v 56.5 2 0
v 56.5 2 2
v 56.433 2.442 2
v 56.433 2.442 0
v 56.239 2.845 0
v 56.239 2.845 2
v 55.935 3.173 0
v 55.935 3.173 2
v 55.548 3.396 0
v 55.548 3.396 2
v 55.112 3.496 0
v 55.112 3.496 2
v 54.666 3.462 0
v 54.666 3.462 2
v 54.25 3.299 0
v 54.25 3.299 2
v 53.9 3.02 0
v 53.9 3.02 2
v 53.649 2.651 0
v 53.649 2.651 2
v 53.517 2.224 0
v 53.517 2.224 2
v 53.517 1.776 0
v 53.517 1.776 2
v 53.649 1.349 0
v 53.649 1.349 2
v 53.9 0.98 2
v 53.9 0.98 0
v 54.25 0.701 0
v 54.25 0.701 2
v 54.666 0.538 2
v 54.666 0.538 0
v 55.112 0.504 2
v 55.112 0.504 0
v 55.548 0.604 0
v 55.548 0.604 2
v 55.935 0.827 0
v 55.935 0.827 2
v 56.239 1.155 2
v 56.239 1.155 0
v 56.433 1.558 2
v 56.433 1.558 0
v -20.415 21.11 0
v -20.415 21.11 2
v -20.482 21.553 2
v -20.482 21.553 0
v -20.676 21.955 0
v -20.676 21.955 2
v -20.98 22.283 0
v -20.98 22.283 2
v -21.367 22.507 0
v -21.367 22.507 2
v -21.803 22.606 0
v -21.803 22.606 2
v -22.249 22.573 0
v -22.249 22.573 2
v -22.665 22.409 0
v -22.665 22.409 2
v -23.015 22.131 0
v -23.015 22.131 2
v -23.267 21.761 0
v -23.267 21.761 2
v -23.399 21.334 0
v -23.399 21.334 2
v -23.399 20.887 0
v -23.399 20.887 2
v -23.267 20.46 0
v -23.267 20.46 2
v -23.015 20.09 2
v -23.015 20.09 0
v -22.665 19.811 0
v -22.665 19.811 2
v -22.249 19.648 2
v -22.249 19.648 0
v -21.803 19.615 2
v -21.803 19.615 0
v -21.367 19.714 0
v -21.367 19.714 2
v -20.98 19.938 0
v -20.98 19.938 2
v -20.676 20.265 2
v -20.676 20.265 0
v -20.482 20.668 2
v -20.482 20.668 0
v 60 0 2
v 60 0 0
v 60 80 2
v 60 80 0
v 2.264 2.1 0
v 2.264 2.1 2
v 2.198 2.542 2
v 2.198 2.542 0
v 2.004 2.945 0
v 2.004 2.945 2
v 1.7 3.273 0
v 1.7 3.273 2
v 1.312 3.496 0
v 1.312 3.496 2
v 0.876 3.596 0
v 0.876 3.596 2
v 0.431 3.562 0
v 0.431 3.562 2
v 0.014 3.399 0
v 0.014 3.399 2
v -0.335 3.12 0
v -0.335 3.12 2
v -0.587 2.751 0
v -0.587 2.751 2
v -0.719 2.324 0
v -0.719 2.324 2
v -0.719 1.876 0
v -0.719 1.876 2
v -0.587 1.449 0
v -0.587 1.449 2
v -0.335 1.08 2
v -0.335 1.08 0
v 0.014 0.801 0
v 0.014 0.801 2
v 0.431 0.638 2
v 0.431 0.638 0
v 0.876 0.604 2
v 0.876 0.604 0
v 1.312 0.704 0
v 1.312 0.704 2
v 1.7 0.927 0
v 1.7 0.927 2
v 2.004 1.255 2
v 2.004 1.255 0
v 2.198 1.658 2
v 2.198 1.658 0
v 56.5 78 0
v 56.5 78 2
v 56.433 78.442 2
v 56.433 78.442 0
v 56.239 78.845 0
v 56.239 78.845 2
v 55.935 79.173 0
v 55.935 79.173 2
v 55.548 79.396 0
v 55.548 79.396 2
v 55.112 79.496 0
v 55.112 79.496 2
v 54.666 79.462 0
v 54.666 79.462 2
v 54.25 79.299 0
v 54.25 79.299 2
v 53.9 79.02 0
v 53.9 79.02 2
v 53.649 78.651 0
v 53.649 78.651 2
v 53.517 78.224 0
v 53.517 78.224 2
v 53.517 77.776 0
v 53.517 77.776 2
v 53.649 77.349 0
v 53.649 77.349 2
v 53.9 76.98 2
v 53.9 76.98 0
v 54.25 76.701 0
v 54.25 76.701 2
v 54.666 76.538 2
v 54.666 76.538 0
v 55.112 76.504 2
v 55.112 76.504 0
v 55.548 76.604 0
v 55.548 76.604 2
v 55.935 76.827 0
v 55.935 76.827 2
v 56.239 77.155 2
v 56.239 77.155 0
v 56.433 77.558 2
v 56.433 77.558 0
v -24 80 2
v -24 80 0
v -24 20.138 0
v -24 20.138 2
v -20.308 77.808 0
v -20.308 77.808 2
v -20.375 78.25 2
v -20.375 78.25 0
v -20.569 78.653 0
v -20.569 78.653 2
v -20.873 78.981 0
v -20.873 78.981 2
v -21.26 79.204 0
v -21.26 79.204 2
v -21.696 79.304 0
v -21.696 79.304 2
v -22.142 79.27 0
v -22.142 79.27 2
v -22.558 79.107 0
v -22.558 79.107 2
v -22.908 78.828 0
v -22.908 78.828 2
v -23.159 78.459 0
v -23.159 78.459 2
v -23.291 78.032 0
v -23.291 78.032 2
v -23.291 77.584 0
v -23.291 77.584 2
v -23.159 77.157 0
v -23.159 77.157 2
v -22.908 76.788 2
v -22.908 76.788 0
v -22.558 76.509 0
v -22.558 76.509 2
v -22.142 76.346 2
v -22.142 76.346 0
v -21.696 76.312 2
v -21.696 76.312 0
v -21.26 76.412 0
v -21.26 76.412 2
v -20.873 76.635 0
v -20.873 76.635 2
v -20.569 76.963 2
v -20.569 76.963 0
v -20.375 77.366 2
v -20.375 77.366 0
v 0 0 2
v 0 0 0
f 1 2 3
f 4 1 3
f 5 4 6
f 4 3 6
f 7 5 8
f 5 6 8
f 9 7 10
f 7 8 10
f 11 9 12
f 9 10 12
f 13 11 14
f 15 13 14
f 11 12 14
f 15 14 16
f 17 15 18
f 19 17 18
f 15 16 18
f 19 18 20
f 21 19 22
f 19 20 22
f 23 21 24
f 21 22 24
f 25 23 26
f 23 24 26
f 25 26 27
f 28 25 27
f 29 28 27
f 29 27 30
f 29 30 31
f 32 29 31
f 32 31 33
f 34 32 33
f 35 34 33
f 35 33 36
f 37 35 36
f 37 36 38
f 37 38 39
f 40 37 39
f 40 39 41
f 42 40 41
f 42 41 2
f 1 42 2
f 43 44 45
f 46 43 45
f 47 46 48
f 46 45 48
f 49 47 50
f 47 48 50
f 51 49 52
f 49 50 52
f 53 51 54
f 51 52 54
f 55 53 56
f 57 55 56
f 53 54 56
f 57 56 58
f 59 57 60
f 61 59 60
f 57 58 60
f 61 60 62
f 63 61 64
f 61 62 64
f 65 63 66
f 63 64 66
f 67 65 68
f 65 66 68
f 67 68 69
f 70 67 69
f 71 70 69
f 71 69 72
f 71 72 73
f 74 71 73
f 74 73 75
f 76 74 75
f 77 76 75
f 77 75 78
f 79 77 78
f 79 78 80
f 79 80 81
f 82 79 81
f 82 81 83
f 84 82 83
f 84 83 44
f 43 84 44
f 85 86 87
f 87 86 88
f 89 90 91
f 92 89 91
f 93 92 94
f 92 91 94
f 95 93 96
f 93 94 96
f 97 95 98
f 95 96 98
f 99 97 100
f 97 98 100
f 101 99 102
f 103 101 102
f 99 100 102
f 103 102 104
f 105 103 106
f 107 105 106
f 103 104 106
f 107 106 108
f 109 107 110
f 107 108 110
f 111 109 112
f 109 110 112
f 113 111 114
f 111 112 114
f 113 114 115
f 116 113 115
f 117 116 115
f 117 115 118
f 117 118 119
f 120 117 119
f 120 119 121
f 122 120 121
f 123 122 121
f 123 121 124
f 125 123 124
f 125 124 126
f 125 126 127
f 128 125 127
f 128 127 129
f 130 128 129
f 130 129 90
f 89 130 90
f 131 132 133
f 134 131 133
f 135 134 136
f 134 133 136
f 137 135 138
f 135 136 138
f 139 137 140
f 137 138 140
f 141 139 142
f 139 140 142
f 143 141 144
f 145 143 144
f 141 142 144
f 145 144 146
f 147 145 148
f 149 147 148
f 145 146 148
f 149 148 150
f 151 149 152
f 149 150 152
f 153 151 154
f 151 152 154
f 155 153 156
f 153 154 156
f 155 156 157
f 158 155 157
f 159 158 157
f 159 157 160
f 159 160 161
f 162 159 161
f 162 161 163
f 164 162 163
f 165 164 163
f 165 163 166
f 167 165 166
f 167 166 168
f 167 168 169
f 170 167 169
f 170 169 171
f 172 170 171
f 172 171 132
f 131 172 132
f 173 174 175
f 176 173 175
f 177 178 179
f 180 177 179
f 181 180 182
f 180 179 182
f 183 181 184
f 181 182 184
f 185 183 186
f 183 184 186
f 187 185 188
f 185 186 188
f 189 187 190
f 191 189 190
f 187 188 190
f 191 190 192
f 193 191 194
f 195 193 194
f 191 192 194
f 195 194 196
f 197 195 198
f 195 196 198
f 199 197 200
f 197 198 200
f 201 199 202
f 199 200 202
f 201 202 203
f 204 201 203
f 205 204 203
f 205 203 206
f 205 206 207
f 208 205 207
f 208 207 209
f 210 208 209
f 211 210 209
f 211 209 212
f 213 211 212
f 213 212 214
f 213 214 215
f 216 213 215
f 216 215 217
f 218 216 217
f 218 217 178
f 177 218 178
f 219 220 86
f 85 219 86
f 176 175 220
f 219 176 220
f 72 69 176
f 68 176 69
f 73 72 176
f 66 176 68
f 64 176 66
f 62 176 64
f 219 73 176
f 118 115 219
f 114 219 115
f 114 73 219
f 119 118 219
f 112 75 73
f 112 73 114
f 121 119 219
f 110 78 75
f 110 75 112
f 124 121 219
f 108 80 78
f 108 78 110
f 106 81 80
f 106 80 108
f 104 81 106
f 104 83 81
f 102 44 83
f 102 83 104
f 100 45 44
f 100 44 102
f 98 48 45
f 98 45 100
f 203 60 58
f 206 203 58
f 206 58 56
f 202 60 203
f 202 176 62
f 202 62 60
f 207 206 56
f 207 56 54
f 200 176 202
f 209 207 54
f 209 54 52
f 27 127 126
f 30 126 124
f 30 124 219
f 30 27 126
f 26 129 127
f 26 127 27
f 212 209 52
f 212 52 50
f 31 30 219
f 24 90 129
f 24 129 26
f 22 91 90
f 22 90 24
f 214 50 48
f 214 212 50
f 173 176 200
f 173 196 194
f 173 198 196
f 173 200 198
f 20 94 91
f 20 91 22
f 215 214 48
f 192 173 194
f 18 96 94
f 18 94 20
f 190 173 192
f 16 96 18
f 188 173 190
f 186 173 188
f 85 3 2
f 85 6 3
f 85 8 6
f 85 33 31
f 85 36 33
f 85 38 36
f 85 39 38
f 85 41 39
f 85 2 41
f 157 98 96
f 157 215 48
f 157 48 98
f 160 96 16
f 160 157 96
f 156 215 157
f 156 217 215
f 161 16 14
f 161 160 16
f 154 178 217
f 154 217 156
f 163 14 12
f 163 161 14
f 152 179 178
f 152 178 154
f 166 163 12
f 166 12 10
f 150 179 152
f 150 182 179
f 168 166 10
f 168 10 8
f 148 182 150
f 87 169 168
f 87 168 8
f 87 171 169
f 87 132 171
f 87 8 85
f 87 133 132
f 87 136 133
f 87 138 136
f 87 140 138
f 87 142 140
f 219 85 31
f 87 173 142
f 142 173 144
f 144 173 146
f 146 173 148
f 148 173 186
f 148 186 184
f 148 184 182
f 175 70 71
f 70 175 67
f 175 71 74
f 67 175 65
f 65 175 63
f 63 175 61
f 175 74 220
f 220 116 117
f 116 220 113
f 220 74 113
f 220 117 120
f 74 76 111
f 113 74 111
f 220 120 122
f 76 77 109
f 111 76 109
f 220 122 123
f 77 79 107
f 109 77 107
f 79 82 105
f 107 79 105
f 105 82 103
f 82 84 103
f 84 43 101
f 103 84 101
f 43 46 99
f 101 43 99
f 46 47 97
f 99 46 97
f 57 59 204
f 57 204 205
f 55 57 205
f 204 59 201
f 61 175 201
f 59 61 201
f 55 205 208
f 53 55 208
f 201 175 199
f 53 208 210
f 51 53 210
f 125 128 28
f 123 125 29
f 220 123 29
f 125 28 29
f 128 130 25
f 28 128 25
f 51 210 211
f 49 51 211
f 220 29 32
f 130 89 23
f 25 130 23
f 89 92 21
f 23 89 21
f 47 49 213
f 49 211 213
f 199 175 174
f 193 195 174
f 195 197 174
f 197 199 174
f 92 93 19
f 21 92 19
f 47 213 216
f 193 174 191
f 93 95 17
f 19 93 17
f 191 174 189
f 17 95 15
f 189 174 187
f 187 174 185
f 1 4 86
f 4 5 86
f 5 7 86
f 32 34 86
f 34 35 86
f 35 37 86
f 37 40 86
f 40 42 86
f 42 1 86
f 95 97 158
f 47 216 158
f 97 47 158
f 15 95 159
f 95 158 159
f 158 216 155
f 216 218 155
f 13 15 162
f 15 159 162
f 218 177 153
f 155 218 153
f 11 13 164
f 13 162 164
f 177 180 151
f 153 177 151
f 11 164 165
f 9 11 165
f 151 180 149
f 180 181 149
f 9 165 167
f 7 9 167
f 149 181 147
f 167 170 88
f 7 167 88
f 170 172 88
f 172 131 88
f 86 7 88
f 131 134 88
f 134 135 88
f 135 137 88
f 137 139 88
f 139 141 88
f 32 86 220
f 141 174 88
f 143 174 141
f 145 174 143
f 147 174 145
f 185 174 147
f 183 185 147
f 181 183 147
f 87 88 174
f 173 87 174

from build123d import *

# Parameters (mm, degrees)
SALIENTE_EXTRUIR1_DEPTH = 2
CROQUIS9_R              = 1.5
CORTAR_EXTRUIR5_DEPTH   = 6


with BuildPart() as part:
    # Croquis1 → Saliente-Extruir1 (new body)
    with BuildSketch(Plane.XY):
        Polygon((0, 0), (60, 0), (60, 80), (-24, 80), (-24, 20.138391148), align=None)
    extrude(amount=SALIENTE_EXTRUIR1_DEPTH)

    # Croquis9 → Cortar-Extruir5 (cut)
    with BuildSketch(Plane.XY.offset(2)):
        with Locations((-21.807968978, 77.807968978)):
            Circle(CROQUIS9_R)
        with Locations((-21.91549209, 21.11041315)):
            Circle(CROQUIS9_R)
        with Locations((0.764337492, 2.1)):
            Circle(CROQUIS9_R)
        with Locations((55, 78)):
            Circle(CROQUIS9_R)
        with Locations((55, 2)):
            Circle(CROQUIS9_R)
    extrude(amount=-CORTAR_EXTRUIR5_DEPTH, mode=Mode.SUBTRACT)


solid = part.part
